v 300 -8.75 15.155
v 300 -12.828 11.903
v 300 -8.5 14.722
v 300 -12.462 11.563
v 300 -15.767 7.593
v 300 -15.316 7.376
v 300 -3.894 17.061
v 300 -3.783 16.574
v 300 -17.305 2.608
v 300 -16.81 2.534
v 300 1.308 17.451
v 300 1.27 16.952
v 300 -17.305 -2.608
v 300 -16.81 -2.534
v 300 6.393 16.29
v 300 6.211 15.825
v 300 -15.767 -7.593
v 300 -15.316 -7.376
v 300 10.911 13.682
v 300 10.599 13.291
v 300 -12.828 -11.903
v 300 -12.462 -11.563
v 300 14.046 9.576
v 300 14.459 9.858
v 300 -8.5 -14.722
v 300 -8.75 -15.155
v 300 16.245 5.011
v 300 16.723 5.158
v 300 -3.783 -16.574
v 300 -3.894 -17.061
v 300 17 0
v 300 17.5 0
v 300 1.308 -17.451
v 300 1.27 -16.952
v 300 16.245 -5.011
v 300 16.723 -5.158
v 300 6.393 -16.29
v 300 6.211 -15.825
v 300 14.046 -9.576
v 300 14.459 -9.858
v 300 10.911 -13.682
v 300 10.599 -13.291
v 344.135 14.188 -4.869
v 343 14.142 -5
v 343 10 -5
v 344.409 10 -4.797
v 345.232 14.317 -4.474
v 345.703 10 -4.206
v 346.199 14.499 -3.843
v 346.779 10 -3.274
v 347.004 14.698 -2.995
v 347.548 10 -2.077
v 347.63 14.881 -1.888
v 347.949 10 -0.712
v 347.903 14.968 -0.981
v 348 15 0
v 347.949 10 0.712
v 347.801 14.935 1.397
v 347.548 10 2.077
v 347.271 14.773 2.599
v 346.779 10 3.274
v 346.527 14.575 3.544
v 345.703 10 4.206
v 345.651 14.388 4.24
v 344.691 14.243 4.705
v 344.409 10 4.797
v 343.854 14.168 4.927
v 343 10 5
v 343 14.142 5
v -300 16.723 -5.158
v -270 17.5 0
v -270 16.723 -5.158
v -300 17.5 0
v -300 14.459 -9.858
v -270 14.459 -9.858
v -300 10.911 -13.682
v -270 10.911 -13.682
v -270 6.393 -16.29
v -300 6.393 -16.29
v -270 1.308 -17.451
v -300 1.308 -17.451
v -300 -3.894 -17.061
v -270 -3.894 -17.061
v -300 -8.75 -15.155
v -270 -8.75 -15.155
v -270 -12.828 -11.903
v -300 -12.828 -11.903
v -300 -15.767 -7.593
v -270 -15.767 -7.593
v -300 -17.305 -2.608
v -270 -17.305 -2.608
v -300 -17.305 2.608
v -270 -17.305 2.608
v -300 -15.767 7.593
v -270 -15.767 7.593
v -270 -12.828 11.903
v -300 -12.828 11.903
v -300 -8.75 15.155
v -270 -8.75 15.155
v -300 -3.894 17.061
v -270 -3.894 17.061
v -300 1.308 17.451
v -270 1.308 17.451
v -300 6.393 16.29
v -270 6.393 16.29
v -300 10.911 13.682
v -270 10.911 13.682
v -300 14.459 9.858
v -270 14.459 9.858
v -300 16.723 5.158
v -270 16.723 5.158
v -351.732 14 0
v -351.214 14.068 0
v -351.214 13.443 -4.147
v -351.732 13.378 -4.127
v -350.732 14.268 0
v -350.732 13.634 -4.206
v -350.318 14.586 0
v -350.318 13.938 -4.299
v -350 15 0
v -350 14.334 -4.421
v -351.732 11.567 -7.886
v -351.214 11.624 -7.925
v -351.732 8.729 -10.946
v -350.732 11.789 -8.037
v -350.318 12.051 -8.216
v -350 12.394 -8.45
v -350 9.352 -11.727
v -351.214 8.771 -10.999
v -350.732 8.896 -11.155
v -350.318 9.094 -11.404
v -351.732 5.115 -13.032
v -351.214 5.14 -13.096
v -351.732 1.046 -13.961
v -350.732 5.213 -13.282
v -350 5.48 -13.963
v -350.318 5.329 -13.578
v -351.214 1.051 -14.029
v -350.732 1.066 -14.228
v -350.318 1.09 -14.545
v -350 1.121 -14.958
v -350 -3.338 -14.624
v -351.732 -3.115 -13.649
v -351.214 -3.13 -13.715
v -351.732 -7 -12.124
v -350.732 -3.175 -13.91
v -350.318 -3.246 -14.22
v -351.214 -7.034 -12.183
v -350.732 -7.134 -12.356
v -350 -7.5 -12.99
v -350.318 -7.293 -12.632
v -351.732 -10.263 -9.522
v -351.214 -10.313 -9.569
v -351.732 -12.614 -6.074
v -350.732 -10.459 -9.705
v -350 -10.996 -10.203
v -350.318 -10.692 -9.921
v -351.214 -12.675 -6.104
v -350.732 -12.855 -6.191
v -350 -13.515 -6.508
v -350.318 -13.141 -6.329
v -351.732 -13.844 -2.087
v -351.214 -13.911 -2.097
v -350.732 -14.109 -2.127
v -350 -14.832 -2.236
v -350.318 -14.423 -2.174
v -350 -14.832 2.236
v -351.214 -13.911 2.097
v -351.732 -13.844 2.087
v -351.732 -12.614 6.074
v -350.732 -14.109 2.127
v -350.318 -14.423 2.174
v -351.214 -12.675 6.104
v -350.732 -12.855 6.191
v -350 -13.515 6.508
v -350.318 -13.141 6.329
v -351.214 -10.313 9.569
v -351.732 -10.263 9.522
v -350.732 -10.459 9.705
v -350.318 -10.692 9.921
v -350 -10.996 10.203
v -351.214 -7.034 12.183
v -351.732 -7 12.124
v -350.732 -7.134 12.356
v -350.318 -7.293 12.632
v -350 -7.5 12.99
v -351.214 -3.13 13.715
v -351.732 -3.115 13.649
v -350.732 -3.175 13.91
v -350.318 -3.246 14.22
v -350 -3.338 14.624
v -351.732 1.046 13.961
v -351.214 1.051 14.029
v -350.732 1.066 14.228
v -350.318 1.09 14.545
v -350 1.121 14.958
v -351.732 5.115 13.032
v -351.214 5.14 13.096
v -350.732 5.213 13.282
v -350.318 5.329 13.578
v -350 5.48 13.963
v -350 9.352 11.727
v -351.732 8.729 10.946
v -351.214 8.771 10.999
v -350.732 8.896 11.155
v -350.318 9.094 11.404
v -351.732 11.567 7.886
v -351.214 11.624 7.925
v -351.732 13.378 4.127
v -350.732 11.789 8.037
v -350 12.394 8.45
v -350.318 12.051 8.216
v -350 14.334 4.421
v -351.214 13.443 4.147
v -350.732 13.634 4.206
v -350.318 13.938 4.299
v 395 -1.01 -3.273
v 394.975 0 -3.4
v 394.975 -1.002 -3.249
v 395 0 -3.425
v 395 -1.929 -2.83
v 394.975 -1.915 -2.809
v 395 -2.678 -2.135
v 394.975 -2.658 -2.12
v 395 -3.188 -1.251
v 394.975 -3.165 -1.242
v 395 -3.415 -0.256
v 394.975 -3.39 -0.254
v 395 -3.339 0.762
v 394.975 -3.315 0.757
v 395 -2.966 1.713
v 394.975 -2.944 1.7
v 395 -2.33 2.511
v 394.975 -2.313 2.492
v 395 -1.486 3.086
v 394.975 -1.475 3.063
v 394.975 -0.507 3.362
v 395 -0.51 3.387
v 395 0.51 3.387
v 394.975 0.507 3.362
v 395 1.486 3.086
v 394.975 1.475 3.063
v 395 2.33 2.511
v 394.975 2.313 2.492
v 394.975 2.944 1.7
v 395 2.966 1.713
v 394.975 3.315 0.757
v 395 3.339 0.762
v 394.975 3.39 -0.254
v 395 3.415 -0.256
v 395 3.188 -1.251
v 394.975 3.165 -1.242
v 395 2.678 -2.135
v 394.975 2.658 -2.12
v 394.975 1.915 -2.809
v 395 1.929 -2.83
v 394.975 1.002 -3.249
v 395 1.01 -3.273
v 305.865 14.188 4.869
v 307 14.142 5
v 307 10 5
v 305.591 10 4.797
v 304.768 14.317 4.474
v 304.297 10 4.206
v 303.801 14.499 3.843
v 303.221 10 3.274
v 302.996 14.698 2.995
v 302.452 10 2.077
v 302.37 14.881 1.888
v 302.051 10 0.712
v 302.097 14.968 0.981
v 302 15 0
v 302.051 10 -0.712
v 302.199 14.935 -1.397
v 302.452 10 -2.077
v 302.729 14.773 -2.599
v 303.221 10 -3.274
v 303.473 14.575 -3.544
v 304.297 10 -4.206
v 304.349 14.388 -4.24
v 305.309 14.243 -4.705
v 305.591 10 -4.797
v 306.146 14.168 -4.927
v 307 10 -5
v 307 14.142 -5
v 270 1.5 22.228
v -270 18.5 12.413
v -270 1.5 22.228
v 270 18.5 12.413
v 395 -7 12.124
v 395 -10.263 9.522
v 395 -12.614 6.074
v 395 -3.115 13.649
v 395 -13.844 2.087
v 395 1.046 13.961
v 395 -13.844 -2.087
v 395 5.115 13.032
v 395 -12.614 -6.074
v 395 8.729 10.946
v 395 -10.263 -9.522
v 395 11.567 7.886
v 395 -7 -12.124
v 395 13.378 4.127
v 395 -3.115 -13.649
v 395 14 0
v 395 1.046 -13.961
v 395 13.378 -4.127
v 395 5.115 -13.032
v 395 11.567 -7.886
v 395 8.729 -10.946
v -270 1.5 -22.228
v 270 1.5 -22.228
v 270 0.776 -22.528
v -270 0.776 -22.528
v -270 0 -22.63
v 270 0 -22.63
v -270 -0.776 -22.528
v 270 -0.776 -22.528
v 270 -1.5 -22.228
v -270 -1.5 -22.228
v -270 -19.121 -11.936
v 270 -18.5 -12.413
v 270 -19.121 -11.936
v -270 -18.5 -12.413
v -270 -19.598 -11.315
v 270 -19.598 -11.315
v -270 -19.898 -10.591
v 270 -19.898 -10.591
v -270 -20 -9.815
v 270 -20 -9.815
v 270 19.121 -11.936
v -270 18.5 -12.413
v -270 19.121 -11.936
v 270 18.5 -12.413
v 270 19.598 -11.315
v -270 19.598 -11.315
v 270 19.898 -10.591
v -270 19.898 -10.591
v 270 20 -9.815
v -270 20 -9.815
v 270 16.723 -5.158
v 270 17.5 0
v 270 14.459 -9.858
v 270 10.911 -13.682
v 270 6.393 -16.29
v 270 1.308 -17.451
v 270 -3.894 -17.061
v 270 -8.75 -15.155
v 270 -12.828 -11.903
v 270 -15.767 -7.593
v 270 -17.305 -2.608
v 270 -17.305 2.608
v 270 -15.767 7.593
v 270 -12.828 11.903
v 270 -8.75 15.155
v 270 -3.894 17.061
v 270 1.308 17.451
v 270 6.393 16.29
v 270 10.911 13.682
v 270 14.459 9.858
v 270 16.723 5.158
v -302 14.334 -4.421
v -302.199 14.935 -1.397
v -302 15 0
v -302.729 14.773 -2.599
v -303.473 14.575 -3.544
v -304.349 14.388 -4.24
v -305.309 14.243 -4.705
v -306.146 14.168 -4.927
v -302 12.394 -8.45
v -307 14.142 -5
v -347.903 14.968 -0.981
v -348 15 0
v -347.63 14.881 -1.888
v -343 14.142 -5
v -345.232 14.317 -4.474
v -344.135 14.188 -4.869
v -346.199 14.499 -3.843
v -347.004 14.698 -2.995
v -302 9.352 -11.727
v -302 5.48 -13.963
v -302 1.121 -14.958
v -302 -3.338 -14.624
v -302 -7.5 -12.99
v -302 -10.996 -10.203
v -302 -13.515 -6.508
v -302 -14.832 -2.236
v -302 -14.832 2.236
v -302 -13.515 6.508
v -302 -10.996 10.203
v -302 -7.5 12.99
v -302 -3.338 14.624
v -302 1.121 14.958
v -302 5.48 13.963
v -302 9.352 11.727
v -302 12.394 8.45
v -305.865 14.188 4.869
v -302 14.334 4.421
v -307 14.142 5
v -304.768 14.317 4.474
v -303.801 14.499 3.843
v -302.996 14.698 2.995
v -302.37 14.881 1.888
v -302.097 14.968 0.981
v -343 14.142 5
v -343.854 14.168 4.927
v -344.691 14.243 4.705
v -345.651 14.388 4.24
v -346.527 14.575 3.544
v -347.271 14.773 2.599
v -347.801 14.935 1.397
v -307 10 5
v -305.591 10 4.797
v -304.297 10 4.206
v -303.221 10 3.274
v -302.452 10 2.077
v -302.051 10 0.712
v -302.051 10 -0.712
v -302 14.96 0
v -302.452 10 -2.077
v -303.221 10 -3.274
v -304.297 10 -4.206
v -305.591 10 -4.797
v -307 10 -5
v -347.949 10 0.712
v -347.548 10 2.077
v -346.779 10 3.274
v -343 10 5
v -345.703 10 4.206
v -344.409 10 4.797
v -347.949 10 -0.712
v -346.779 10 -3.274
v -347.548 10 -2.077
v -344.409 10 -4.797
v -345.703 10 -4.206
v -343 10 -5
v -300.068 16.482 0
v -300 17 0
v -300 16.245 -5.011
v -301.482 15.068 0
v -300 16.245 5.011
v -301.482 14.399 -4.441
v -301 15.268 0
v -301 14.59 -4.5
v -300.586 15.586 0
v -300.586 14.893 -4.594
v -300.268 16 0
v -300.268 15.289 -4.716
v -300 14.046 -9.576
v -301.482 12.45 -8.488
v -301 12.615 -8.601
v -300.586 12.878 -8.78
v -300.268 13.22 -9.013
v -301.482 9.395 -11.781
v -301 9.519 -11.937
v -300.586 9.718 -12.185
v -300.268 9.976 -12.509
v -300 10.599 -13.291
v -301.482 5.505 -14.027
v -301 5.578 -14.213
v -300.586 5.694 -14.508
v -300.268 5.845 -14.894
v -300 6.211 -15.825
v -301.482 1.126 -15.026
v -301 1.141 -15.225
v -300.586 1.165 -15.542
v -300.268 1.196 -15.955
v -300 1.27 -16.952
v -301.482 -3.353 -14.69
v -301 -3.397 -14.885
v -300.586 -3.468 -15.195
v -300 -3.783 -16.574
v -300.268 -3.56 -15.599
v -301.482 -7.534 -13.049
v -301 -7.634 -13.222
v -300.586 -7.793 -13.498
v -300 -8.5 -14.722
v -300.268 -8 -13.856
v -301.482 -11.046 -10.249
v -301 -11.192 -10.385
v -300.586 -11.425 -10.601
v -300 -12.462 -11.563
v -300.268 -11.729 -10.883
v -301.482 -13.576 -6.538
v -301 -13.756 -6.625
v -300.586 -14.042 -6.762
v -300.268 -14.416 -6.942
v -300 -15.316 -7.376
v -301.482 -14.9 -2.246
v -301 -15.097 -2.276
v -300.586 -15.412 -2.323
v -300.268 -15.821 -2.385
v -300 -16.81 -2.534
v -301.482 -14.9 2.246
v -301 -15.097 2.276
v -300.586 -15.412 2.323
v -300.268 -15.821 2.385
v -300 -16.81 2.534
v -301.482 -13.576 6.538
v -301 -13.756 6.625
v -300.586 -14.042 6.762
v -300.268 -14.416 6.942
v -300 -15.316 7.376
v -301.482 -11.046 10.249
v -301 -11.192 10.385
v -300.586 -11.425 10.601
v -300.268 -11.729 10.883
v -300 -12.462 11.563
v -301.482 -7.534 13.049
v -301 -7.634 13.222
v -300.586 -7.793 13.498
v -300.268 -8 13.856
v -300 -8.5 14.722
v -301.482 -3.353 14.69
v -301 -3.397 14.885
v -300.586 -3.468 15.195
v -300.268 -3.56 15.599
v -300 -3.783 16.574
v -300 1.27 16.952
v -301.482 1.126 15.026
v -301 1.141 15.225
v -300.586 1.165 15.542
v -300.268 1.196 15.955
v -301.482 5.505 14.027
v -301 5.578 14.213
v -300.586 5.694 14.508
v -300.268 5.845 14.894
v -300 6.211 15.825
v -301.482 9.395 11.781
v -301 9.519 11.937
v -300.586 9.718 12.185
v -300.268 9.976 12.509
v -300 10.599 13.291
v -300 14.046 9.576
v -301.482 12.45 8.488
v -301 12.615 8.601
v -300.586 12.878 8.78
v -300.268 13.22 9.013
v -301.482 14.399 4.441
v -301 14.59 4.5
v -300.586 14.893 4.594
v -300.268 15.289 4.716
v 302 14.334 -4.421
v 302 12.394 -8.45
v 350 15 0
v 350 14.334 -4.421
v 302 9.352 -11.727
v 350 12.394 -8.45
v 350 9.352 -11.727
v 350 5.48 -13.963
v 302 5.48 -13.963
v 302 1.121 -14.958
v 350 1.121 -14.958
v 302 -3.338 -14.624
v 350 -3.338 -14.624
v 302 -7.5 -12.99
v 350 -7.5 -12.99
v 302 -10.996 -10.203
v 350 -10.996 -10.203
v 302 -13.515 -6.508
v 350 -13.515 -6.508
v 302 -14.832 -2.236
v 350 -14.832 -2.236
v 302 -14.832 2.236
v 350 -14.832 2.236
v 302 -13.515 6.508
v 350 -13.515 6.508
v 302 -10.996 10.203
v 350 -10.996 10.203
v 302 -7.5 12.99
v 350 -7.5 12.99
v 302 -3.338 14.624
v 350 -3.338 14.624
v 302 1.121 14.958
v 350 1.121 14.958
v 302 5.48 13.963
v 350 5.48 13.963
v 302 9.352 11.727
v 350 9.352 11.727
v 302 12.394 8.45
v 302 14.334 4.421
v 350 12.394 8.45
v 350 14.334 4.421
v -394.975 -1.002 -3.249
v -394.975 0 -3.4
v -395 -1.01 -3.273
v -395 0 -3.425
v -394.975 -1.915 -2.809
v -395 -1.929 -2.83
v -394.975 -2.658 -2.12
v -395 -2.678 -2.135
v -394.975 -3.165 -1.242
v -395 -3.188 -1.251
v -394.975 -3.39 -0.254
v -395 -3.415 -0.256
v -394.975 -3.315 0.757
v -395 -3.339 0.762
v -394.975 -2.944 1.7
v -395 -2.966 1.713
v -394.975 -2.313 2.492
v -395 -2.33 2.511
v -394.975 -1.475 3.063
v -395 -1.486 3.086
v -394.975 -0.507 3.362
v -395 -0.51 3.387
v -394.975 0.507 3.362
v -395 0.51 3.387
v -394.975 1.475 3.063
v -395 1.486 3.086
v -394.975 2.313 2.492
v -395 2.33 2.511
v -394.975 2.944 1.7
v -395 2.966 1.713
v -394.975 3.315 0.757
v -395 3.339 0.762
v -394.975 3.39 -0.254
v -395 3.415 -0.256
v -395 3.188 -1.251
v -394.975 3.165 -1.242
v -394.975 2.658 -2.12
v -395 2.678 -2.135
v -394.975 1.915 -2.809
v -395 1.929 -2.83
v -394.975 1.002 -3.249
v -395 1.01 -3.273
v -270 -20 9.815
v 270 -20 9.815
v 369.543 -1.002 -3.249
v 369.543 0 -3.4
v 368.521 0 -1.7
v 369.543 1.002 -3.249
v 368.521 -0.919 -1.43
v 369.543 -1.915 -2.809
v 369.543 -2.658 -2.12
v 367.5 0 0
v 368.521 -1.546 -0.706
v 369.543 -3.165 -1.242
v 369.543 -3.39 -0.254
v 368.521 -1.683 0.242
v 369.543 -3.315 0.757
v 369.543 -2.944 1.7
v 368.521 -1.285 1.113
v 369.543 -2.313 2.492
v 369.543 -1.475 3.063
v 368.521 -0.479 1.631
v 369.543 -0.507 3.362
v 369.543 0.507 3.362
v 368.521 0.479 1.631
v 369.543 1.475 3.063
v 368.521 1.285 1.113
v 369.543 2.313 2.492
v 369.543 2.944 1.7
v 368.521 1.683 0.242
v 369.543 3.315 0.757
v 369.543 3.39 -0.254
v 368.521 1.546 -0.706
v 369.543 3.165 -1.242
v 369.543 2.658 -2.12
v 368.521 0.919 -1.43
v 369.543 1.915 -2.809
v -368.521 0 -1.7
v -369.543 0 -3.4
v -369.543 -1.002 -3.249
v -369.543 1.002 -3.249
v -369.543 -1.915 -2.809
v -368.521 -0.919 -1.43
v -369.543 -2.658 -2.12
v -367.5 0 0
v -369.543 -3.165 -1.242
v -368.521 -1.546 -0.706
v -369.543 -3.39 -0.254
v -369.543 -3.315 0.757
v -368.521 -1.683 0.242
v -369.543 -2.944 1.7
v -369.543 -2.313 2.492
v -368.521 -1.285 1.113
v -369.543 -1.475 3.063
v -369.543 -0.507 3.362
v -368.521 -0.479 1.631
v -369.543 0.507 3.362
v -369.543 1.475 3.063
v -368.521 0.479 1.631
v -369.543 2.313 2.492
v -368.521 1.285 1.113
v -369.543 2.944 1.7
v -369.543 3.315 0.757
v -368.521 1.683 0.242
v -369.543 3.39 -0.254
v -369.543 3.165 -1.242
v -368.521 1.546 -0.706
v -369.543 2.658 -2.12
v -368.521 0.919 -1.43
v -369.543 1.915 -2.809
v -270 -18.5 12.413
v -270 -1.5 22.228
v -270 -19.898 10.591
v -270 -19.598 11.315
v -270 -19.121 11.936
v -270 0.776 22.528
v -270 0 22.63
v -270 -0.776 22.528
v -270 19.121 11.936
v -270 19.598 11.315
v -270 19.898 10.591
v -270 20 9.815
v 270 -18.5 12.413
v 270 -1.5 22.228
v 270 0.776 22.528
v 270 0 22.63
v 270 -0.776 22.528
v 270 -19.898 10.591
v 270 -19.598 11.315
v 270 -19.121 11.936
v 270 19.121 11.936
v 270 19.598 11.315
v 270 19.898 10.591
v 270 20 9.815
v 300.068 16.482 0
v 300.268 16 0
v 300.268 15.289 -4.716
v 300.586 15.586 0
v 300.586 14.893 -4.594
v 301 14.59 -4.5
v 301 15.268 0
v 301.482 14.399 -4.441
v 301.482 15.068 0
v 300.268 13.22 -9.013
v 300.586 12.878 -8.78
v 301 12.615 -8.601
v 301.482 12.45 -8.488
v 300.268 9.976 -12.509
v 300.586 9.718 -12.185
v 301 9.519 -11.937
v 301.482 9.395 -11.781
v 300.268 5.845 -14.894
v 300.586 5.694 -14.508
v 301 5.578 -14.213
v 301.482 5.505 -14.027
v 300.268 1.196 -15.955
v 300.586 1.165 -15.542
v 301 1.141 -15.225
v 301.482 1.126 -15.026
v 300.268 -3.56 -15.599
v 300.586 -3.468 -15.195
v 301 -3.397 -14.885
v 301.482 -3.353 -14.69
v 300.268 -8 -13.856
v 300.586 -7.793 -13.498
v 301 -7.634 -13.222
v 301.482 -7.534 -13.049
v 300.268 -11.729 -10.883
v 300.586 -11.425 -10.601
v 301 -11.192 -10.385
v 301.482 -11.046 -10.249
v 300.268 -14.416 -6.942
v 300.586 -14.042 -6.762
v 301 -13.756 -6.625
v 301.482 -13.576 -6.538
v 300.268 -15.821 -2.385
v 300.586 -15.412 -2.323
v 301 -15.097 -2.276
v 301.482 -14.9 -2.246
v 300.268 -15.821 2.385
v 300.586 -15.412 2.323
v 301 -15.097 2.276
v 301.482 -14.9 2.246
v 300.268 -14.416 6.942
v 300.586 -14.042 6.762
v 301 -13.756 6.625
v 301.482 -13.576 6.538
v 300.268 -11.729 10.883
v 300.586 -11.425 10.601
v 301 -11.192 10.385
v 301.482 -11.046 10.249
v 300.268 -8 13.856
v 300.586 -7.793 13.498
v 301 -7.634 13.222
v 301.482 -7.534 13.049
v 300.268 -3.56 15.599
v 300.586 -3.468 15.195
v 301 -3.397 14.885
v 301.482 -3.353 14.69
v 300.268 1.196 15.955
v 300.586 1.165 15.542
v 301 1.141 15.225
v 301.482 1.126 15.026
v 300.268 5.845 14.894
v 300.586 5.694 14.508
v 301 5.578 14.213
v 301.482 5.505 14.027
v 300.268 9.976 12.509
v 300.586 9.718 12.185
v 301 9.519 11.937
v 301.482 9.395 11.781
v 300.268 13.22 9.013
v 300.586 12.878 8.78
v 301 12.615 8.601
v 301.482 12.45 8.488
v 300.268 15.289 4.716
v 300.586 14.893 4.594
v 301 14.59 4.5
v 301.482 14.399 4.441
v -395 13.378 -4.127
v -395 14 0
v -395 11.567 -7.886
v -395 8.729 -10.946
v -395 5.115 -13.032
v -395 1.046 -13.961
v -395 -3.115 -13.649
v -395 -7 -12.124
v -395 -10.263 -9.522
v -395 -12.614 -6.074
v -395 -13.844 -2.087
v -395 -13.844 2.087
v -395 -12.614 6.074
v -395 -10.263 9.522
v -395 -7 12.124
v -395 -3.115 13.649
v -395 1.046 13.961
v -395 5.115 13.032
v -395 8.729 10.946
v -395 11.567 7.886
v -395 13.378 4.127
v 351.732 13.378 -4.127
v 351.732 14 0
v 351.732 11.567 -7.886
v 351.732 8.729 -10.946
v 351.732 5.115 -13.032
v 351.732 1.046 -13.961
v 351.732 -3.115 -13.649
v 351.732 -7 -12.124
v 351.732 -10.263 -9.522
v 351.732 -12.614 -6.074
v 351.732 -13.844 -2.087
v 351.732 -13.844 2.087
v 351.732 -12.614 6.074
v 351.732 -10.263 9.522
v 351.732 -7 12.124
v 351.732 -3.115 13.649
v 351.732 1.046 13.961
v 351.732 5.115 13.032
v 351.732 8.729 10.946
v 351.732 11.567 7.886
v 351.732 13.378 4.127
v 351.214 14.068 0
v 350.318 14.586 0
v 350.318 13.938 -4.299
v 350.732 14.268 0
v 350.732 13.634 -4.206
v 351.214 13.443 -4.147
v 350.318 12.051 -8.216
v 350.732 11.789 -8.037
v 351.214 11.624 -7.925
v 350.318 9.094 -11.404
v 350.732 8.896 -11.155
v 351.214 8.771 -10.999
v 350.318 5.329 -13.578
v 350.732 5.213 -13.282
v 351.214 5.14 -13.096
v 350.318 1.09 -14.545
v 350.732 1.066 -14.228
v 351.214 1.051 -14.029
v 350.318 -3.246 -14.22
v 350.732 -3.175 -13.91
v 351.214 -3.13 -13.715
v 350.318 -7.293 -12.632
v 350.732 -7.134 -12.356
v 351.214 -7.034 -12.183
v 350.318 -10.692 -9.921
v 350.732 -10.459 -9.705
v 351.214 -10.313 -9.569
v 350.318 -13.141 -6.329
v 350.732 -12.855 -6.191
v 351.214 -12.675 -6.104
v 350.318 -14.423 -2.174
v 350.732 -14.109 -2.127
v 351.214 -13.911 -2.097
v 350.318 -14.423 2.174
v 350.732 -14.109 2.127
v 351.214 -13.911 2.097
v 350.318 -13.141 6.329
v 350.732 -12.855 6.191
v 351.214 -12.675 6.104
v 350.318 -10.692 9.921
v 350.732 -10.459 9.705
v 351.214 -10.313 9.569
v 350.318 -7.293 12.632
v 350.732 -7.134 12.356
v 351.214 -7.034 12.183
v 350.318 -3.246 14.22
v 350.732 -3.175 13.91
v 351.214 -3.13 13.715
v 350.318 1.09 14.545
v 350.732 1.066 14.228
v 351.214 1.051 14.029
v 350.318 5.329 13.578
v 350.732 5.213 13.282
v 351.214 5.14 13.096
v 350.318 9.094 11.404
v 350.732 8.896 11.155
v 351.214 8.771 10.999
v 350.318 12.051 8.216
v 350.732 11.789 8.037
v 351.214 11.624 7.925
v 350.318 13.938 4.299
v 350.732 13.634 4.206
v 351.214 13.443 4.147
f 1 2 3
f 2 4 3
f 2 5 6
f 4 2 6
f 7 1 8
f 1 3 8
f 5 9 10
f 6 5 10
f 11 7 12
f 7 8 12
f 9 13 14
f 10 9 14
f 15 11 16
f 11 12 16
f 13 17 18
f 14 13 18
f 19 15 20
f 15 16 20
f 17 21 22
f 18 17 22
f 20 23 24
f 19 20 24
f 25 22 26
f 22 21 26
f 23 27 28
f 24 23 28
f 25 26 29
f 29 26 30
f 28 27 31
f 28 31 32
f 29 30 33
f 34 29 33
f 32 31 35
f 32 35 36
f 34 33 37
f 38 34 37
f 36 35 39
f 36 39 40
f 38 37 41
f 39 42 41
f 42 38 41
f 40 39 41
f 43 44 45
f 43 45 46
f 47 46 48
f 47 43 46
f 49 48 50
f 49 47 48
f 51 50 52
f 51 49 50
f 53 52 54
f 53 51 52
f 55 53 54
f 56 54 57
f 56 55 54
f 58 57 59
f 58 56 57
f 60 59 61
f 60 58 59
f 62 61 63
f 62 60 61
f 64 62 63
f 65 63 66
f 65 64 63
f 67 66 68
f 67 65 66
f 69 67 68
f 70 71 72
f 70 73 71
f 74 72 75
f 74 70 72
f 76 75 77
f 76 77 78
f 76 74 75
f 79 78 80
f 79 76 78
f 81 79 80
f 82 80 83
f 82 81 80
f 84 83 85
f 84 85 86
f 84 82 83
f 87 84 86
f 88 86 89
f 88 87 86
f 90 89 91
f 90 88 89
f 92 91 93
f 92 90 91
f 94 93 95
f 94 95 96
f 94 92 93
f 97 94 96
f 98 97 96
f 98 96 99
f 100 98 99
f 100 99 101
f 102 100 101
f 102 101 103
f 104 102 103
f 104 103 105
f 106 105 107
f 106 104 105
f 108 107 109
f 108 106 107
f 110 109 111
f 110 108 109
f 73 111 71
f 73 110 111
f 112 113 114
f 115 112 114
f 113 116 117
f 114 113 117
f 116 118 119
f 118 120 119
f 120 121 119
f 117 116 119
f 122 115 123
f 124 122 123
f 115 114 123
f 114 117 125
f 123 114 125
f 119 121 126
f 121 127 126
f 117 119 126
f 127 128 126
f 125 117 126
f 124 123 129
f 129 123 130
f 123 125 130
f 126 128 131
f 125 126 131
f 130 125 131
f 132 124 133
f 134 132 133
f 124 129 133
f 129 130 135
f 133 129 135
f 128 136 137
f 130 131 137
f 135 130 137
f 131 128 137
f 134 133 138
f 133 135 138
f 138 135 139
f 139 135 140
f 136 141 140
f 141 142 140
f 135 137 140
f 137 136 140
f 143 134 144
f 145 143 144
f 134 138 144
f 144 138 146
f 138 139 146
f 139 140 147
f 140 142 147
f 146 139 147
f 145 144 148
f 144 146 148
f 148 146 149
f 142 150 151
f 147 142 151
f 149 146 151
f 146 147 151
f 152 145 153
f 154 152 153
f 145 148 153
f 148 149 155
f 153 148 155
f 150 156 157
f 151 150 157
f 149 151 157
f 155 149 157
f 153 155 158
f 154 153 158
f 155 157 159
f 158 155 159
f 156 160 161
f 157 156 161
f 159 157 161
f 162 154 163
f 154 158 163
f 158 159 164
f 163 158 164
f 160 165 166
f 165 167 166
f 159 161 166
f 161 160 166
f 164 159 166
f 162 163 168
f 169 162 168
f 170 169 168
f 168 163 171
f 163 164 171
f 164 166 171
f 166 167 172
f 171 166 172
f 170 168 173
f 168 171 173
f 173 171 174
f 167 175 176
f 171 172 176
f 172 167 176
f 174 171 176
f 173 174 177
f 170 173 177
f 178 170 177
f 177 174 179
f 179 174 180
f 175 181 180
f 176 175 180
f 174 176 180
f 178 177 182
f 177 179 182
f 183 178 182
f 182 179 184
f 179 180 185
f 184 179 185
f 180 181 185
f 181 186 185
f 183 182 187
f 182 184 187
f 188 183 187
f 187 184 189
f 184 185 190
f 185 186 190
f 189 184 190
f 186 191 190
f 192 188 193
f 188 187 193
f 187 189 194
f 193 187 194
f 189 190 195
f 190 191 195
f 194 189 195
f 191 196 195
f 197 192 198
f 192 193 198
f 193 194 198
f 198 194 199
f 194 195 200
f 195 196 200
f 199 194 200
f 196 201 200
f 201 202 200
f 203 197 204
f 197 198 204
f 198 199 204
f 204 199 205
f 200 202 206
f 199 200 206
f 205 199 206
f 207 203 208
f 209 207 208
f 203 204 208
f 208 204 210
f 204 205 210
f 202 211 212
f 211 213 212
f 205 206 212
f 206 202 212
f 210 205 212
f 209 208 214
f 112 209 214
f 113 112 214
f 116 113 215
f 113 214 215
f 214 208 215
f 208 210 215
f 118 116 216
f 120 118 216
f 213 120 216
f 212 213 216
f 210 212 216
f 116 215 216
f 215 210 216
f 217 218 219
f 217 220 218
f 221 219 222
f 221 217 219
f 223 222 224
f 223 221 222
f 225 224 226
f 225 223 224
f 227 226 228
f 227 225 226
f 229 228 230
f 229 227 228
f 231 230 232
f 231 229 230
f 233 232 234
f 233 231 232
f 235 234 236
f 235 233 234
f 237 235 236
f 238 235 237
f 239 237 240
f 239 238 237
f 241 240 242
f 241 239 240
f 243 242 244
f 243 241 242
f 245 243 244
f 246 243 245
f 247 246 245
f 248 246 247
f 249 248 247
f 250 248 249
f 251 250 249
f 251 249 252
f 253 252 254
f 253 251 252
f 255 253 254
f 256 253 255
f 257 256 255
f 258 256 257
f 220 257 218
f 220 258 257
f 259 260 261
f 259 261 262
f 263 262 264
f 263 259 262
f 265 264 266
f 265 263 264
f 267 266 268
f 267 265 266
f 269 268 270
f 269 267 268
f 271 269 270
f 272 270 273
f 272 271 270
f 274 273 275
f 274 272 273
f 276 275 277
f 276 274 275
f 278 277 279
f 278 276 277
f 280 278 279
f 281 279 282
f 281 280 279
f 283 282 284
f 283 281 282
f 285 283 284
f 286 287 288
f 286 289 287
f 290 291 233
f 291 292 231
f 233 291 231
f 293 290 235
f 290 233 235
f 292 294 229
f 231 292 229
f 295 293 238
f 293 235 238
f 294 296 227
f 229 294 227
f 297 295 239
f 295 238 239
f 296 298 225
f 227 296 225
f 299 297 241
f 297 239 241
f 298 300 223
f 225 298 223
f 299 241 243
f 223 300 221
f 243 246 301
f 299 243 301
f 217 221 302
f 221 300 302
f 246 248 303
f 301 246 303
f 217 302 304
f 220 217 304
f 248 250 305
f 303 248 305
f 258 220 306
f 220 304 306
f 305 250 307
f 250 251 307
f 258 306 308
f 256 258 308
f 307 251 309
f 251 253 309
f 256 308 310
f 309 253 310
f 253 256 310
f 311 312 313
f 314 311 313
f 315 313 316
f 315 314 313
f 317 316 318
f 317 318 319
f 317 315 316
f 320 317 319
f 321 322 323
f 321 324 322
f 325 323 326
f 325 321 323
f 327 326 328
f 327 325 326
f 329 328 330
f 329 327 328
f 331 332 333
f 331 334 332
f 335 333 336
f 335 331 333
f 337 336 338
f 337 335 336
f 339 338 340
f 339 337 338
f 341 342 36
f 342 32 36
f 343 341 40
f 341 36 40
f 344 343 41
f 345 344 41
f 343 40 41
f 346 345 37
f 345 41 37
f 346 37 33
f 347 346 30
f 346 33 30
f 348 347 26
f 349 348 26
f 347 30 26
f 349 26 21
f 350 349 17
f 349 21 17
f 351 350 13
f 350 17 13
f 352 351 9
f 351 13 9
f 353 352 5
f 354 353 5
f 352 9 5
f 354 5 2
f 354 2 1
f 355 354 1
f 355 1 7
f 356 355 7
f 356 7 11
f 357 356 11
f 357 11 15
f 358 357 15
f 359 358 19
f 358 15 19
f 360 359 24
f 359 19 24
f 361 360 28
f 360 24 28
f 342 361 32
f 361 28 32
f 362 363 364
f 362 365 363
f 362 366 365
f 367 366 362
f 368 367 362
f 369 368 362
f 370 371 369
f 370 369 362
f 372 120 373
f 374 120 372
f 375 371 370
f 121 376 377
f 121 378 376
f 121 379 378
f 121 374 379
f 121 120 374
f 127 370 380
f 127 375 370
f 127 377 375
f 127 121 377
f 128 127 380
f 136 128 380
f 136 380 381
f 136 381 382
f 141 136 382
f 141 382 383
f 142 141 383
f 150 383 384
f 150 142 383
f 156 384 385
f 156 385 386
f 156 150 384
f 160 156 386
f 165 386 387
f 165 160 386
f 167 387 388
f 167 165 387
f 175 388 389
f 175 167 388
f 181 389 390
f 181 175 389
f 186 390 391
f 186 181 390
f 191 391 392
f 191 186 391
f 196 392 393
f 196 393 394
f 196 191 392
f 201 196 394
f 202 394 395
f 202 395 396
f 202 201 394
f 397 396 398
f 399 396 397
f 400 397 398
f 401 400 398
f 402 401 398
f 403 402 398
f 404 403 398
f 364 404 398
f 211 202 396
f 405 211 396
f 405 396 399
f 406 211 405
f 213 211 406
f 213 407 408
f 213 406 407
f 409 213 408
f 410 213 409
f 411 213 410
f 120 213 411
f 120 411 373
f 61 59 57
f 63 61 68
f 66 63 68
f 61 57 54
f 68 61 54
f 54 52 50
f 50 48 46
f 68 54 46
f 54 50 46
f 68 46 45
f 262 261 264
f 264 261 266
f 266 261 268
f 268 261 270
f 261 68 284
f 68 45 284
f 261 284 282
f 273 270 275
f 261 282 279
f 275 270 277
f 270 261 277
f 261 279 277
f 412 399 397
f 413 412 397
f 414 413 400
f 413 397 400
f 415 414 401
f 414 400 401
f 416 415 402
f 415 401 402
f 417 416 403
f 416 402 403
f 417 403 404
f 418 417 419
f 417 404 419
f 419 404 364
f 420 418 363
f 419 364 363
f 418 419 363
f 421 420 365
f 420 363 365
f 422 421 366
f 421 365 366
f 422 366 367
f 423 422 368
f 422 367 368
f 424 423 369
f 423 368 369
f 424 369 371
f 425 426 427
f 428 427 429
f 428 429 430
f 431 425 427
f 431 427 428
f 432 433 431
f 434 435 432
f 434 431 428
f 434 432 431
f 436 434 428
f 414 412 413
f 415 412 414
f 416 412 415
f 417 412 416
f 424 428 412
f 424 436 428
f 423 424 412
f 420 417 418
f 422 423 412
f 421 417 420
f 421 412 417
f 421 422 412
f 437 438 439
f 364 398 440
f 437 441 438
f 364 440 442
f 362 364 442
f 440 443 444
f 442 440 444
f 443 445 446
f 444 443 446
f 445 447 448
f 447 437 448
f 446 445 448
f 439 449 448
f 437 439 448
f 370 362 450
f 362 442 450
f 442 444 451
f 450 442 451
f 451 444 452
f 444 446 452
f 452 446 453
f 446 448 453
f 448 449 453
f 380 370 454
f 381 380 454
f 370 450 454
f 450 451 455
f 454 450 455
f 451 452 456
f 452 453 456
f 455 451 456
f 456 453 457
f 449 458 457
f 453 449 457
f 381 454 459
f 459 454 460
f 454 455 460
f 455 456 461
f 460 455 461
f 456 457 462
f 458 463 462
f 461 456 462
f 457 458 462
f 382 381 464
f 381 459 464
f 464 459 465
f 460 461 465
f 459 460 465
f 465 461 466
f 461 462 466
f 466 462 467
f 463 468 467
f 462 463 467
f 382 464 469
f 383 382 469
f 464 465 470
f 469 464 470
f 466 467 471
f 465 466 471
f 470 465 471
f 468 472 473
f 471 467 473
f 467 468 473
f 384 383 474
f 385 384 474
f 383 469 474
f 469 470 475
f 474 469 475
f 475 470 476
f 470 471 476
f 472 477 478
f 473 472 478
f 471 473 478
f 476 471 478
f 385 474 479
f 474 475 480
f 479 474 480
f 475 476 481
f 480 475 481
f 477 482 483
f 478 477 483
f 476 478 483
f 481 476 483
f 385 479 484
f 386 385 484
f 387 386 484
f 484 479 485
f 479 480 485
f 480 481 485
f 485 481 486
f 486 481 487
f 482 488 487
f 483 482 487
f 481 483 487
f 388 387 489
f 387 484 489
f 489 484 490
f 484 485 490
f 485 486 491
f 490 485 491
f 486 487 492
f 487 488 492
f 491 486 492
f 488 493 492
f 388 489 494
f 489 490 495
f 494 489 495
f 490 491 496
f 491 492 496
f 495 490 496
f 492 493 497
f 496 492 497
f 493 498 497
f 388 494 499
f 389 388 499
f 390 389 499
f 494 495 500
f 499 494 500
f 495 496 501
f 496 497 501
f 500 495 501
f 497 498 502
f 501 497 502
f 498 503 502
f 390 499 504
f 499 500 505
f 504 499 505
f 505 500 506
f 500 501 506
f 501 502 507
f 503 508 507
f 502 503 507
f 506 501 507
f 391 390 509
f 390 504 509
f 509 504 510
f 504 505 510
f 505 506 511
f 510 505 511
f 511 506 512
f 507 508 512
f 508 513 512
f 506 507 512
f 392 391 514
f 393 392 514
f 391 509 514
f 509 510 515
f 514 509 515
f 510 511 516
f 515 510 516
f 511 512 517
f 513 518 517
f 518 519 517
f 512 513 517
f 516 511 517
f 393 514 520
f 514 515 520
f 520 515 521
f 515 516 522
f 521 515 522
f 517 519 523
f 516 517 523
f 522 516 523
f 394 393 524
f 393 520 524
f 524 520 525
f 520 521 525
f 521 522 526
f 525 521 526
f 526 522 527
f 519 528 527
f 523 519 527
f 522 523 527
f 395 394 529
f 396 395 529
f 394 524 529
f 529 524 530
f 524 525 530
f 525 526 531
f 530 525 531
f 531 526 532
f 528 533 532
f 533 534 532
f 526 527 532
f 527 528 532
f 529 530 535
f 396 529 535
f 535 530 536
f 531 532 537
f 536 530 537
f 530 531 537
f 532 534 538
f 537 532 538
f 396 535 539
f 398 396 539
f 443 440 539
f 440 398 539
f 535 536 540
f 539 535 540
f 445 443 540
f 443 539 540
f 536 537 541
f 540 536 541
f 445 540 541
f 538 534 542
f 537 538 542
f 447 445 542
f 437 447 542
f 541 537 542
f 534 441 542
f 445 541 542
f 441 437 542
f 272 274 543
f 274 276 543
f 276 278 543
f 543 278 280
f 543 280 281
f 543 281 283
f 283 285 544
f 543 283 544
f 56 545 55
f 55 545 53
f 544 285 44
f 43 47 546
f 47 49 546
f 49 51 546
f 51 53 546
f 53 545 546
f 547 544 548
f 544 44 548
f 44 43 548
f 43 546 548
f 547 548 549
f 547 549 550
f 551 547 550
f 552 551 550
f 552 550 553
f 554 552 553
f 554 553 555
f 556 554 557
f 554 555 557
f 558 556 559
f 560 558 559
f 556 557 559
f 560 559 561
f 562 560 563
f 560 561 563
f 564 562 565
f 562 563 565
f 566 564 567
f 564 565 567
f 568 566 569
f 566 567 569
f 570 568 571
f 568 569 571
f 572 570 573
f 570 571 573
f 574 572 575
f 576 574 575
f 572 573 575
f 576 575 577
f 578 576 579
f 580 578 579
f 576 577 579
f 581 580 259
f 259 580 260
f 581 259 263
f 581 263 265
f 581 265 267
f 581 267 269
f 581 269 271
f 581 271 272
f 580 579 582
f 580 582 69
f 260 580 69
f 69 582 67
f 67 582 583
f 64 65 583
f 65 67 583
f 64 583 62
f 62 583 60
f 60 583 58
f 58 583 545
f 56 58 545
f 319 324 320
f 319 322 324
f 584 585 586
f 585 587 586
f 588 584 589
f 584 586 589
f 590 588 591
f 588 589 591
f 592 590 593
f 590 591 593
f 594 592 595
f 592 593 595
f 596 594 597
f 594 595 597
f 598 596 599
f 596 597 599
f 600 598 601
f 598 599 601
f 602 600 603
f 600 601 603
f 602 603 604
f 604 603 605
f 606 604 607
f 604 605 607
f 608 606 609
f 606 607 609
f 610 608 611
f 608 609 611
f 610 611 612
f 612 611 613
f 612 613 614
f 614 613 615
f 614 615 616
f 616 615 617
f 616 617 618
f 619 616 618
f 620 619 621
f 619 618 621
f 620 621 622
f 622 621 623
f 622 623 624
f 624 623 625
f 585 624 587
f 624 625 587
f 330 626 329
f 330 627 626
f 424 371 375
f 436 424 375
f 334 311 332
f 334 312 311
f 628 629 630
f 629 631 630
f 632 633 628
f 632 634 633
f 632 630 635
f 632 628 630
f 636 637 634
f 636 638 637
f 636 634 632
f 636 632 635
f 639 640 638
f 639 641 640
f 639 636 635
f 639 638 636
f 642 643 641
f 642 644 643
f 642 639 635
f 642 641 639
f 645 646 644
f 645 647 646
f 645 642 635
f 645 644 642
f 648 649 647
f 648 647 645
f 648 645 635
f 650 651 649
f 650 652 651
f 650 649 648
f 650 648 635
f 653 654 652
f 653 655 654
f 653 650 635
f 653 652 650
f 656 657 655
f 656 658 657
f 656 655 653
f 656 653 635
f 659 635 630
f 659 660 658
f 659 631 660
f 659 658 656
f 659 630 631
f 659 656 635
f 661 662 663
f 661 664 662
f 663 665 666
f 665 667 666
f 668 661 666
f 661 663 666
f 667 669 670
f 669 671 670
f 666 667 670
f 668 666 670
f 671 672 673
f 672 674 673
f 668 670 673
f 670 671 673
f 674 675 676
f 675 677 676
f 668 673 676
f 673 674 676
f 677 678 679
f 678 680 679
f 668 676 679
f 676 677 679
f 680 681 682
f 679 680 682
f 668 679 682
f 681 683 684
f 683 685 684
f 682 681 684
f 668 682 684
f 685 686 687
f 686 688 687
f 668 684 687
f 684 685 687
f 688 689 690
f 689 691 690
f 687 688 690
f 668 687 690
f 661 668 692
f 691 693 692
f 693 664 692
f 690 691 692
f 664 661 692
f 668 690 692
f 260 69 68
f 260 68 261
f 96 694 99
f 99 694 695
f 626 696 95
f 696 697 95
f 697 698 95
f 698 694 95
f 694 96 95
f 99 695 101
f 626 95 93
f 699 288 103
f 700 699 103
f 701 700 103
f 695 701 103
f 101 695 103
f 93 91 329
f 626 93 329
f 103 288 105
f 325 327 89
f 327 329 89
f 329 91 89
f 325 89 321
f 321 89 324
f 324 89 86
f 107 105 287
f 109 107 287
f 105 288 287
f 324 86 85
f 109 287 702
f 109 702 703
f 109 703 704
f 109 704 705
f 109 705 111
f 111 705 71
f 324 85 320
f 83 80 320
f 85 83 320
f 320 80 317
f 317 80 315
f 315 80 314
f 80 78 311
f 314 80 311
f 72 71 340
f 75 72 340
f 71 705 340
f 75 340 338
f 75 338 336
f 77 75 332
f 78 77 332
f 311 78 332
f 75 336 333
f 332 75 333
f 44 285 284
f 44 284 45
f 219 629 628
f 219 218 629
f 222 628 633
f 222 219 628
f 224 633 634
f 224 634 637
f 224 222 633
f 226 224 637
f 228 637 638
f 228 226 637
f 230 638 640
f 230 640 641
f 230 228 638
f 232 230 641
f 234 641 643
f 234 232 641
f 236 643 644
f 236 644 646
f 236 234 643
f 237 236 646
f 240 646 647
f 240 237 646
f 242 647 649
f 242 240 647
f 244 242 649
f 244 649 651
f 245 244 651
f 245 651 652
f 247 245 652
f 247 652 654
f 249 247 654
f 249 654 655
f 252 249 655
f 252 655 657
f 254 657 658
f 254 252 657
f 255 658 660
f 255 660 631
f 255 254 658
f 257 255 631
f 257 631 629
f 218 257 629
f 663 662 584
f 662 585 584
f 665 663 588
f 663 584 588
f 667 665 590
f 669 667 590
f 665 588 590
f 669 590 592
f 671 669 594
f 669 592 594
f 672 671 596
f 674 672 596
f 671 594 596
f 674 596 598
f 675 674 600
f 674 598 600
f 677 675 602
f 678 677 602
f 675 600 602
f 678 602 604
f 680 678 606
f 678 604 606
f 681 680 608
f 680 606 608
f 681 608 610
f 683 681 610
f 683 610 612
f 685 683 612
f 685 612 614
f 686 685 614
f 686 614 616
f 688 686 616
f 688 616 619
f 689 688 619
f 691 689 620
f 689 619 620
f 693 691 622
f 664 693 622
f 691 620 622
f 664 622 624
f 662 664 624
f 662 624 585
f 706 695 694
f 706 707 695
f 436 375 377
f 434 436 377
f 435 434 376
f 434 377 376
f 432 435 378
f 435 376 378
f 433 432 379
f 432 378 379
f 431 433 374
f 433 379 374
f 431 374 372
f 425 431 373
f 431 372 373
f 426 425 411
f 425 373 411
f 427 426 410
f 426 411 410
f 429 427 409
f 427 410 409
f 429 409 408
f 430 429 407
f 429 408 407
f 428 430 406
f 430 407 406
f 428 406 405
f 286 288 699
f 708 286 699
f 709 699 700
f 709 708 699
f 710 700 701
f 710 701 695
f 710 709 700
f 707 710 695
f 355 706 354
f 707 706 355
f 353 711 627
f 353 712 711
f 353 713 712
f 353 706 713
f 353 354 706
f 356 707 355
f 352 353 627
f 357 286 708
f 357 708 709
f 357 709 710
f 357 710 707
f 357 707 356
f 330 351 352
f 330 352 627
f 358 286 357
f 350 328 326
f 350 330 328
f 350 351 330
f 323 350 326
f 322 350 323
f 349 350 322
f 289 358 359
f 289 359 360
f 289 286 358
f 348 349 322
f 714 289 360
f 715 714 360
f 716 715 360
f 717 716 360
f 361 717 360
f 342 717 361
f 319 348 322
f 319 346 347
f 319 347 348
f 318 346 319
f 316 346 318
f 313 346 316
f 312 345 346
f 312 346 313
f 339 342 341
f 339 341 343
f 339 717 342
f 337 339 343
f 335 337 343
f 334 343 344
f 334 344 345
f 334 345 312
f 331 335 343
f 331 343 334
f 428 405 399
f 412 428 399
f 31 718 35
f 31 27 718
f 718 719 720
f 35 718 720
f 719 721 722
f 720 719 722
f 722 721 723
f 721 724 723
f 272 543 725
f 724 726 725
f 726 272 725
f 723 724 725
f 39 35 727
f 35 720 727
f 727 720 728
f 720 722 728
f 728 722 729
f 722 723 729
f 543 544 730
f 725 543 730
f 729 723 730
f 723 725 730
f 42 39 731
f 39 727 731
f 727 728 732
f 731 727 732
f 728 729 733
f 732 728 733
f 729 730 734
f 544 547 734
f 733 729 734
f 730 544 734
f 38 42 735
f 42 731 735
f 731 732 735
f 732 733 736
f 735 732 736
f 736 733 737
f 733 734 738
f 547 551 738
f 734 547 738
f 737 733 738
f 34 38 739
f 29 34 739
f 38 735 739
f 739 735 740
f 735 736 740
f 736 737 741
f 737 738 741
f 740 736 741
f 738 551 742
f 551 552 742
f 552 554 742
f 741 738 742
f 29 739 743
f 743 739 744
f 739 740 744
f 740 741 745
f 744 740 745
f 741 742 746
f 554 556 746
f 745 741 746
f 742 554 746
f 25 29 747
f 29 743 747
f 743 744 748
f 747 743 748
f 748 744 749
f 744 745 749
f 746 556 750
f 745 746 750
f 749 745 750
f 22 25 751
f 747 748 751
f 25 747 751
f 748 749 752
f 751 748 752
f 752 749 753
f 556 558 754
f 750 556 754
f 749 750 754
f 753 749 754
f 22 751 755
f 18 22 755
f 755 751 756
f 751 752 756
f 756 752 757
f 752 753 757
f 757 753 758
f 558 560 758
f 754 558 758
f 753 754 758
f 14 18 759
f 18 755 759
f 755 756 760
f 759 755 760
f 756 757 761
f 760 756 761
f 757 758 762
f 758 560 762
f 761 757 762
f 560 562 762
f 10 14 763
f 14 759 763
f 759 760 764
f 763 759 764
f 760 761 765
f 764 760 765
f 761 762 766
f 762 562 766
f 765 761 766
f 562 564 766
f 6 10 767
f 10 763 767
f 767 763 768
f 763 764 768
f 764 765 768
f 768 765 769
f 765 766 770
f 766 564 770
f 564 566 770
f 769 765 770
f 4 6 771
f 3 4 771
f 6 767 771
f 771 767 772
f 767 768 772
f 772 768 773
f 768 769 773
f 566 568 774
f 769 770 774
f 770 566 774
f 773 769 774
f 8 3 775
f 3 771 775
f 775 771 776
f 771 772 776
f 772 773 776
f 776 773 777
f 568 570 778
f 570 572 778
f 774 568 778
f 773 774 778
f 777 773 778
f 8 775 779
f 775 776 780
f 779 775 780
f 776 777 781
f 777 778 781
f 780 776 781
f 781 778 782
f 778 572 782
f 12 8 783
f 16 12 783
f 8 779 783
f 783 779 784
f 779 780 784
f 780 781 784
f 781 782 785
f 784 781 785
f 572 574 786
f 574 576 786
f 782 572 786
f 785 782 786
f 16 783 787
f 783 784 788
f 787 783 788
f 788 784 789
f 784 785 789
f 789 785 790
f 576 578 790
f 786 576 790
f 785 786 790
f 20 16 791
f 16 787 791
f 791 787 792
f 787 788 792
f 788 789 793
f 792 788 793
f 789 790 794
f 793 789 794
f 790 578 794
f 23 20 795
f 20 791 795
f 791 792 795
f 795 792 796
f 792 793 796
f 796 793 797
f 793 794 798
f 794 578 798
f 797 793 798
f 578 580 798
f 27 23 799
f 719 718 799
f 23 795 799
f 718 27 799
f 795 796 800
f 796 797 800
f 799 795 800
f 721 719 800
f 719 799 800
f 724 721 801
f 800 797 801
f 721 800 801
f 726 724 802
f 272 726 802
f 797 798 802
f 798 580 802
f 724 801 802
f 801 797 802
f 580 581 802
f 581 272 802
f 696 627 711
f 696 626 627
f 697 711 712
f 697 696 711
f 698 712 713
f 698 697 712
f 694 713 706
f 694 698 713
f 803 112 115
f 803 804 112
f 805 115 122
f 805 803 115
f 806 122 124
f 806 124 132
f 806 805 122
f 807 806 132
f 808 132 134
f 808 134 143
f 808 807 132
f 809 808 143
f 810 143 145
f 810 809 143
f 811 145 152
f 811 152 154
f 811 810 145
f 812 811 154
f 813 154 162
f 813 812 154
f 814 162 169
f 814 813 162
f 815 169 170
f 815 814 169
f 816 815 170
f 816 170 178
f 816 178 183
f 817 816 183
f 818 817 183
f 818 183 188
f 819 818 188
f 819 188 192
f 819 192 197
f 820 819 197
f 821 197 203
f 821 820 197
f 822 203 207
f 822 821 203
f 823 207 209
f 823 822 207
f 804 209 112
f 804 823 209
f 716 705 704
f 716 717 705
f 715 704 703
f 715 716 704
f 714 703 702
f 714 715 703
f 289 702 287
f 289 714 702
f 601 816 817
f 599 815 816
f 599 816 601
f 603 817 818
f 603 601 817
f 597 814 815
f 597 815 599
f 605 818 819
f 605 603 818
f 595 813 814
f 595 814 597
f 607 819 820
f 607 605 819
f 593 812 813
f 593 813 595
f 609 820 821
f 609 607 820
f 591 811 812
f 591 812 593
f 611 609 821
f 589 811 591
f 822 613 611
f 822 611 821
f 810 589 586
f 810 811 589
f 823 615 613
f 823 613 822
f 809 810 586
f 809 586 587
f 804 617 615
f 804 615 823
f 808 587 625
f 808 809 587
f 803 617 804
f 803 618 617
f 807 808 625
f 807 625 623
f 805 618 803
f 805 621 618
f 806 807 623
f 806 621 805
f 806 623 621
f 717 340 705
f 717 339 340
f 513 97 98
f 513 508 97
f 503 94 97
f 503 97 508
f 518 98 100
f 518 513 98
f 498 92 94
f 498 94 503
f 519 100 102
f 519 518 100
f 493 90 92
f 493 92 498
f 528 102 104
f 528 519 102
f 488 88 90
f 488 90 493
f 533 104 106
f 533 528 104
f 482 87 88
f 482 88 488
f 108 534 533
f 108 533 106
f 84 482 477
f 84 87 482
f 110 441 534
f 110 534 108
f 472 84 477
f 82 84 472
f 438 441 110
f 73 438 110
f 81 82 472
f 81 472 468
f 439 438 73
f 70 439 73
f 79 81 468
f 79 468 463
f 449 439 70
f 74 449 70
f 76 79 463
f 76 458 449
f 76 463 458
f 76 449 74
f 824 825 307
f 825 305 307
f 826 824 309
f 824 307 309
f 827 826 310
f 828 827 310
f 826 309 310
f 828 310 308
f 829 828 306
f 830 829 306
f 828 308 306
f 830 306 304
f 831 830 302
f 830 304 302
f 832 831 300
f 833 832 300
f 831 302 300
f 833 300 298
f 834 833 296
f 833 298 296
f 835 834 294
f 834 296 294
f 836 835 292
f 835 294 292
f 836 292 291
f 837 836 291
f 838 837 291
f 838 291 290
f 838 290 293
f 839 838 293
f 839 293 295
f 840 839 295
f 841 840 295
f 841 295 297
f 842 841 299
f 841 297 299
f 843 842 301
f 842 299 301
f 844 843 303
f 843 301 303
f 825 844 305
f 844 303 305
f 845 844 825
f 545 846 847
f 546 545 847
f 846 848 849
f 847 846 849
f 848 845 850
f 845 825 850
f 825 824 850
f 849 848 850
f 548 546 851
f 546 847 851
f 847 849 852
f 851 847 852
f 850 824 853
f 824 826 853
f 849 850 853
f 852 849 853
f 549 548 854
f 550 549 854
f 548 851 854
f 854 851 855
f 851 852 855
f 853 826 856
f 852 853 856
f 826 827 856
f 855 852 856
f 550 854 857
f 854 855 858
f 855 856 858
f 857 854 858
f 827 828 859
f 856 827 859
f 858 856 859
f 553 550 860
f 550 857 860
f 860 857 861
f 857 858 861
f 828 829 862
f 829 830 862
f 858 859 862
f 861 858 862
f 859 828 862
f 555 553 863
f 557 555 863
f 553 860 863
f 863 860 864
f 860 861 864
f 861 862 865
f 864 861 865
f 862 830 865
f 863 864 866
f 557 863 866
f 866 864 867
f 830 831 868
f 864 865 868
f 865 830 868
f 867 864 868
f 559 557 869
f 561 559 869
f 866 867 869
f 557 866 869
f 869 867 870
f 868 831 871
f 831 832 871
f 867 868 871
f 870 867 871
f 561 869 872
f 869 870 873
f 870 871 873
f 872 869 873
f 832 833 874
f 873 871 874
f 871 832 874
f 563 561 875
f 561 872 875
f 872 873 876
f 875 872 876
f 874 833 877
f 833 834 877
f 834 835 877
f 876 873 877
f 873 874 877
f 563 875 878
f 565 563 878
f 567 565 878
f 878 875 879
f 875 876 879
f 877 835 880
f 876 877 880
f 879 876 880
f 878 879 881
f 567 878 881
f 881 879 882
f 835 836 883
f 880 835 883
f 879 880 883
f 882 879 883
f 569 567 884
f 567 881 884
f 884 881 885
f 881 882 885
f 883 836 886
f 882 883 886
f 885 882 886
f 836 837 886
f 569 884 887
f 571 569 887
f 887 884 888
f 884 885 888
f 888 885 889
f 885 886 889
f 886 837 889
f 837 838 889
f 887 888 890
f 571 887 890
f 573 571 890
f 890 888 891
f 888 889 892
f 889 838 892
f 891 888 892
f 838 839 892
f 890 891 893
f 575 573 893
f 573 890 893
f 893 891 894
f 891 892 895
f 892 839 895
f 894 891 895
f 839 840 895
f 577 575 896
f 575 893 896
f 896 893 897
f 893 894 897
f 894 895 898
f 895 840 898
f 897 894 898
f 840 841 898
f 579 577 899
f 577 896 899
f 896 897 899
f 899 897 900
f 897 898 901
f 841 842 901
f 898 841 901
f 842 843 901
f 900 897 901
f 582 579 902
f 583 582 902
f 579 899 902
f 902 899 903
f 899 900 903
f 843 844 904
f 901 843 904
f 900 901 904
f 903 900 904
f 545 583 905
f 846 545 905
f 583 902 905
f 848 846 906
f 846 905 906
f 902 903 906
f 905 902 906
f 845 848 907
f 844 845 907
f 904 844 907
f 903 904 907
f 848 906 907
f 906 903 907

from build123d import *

# Parameters (mm, degrees)
BOSS_EXTRUDE1_DEPTH  = 270
FILLET1_R            = 2
CUT_EXTRUDE1_DEPTH   = 5
FILLET1_OF_MIRROR1_R = 2
FILLET2_R            = 3


with BuildPart() as part:
    # Sketch1 → Boss-Extrude1 (new, symmetric)
    with BuildSketch(Plane(origin=(0, 0, 0), x_dir=(0, 0, -1), z_dir=(1, 0, 0))):
        Polygon((23.094010768, 0), (11.547005384, 20), (-11.547005384, 20), (-23.094010768, 0), (-11.547005384, -20), (11.547005384, -20), align=None)
    extrude(amount=BOSS_EXTRUDE1_DEPTH, both=True)

    # Sketch2 → Revolve1 (revolve)
    with BuildSketch(Plane.XY):
        Polygon((270, 17.5), (300, 17.5), (300, 15), (350, 15), (350, 14), (395, 14), (395, 0), (270, 0), align=None)
    revolve1 = revolve(axis=Axis((395, 0, 0), (-1, 0, 0)))

    # Fillet1
    # the kernel refuses this fillet: 2 mm, written as the material it adds along each edge
    with BuildSketch(Plane(origin=(300, 0, 0), x_dir=(0, 1, 0), z_dir=(0, 0, 1))) as fillet1_piece_1:
        with BuildLine():
            CenterArc((15 + FILLET1_R, -FILLET1_R), FILLET1_R, 90, 90)
            Line((15, -FILLET1_R), (15 - FILLET1_R * 0.02, -FILLET1_R))
            Line((15 - FILLET1_R * 0.02, -FILLET1_R), (15 - FILLET1_R * 0.02, FILLET1_R * 0.02))
            Line((15 - FILLET1_R * 0.02, FILLET1_R * 0.02), (15 + FILLET1_R, FILLET1_R * 0.02))
            Line((15 + FILLET1_R, FILLET1_R * 0.02), (15 + FILLET1_R, 0))
        make_face()
    revolve(axis=Axis((300, 0, 0), (-1, 0, 0)))
    with BuildSketch(Plane(origin=(350, 0, 0), x_dir=(0, 1, 0), z_dir=(0, 0, 1))) as fillet1_piece_2:
        with BuildLine():
            CenterArc((16, -1.732050808), FILLET1_R, 120, 60)
            Line((14, -1.732050808), (13.96, -1.732050808))
            Line((13.96, -1.732050808), (13.96, 0))
            Line((13.96, 0), (14, 0.04))
            ThreePointArc((14, 0.04), (14.5, 0.04), (14.98, 0.034641016))
            Line((14.98, 0.034641016), (15, 0))
        make_face()
    revolve(axis=Axis((350, 0, 0), (-1, 0, 0)))

    # Sketch3 → Cut-Extrude1 (cut)
    with BuildSketch(Plane(origin=(0, 15, 0), x_dir=(1, 0, 0), z_dir=(0, 1, 0))):
        with BuildLine():
            Line((307, 5), (343, 5))
            ThreePointArc((343, 5), (348, 0), (343, -5))
            Line((343, -5), (307, -5))
            ThreePointArc((307, -5), (302, 0), (307, 5))
        make_face()
    cut_extrude1 = extrude(amount=-CUT_EXTRUDE1_DEPTH, mode=Mode.SUBTRACT)

    # Mirror1: Revolve1, Cut-Extrude1 across plane
    add(revolve1.mirror(Plane(origin=(0, 0, 0), x_dir=(0, 0, 1), z_dir=(1, 0, 0))))
    add(cut_extrude1.mirror(Plane(origin=(0, 0, 0), x_dir=(0, 0, 1), z_dir=(1, 0, 0))), mode=Mode.SUBTRACT)

    # Fillet1 of Mirror1
    # the kernel refuses this fillet: 2 mm, written as the material it adds along each edge
    with BuildSketch(Plane(origin=(-300, 0, 0), x_dir=(0, 1, 0), z_dir=(0, 0, 1))) as fillet1_of_mirror1_piece_1:
        with BuildLine():
            CenterArc((15 + FILLET1_OF_MIRROR1_R, FILLET1_OF_MIRROR1_R), FILLET1_OF_MIRROR1_R, 180, 90)
            Line((15, FILLET1_OF_MIRROR1_R), (15 - FILLET1_OF_MIRROR1_R * 0.02, FILLET1_OF_MIRROR1_R))
            Line((15 - FILLET1_OF_MIRROR1_R * 0.02, FILLET1_OF_MIRROR1_R), (15 - FILLET1_OF_MIRROR1_R * 0.02, -FILLET1_OF_MIRROR1_R * 0.02))
            Line((15 - FILLET1_OF_MIRROR1_R * 0.02, -FILLET1_OF_MIRROR1_R * 0.02), (15 + FILLET1_OF_MIRROR1_R, -FILLET1_OF_MIRROR1_R * 0.02))
            Line((15 + FILLET1_OF_MIRROR1_R, -FILLET1_OF_MIRROR1_R * 0.02), (15 + FILLET1_OF_MIRROR1_R, 0))
        make_face()
    revolve(axis=Axis((-300, 0, 0), (-1, 0, 0)))
    with BuildSketch(Plane(origin=(-350, 0, 0), x_dir=(0, 1, 0), z_dir=(0, 0, 1))) as fillet1_of_mirror1_piece_2:
        with BuildLine():
            CenterArc((16, 1.732050808), FILLET1_OF_MIRROR1_R, 180, 60)
            Line((14, 1.732050808), (13.96, 1.732050808))
            Line((13.96, 1.732050808), (13.96, 0))
            Line((13.96, 0), (14, -0.04))
            ThreePointArc((14, -0.04), (14.5, -0.04), (14.98, -0.034641016))
            Line((14.98, -0.034641016), (15, 0))
        make_face()
    revolve(axis=Axis((-350, 0, 0), (-1, 0, 0)))

    # Fillet2
    fillet2_edges = [part.edges().sort_by_distance(p)[0] for p in [
        (0, -20, -11.547005384),
        (0, -20, 11.547005384),
        (0, 0, 23.094010768),
        (0, 20, 11.547005384),
        (0, 20, -11.547005384),
        (0, 0, -23.094010768),
    ]]
    fillet(fillet2_edges, radius=FILLET2_R)

    # Sketch5 → Tap Drill for M8 Tap1 (revolve, cut)
    with BuildSketch(Plane(origin=(395, 0, 0), x_dir=(0, 0, -1), z_dir=(0, 1, 0))):
        Polygon((0, 0), (0, 27.5), (3.4, 25.457073895), (3.4, 0.025), (3.425, 0), align=None)
    tap_drill_for_m8_tap1 = revolve(axis=Axis((401.35, 0, 0), (-1, 0, 0)), mode=Mode.SUBTRACT)

    # Mirror2: Tap Drill for M8 Tap1 across plane
    add(tap_drill_for_m8_tap1.mirror(Plane(origin=(0, 0, 0), x_dir=(0, 0, 1), z_dir=(1, 0, 0))), mode=Mode.SUBTRACT)


solid = part.part
